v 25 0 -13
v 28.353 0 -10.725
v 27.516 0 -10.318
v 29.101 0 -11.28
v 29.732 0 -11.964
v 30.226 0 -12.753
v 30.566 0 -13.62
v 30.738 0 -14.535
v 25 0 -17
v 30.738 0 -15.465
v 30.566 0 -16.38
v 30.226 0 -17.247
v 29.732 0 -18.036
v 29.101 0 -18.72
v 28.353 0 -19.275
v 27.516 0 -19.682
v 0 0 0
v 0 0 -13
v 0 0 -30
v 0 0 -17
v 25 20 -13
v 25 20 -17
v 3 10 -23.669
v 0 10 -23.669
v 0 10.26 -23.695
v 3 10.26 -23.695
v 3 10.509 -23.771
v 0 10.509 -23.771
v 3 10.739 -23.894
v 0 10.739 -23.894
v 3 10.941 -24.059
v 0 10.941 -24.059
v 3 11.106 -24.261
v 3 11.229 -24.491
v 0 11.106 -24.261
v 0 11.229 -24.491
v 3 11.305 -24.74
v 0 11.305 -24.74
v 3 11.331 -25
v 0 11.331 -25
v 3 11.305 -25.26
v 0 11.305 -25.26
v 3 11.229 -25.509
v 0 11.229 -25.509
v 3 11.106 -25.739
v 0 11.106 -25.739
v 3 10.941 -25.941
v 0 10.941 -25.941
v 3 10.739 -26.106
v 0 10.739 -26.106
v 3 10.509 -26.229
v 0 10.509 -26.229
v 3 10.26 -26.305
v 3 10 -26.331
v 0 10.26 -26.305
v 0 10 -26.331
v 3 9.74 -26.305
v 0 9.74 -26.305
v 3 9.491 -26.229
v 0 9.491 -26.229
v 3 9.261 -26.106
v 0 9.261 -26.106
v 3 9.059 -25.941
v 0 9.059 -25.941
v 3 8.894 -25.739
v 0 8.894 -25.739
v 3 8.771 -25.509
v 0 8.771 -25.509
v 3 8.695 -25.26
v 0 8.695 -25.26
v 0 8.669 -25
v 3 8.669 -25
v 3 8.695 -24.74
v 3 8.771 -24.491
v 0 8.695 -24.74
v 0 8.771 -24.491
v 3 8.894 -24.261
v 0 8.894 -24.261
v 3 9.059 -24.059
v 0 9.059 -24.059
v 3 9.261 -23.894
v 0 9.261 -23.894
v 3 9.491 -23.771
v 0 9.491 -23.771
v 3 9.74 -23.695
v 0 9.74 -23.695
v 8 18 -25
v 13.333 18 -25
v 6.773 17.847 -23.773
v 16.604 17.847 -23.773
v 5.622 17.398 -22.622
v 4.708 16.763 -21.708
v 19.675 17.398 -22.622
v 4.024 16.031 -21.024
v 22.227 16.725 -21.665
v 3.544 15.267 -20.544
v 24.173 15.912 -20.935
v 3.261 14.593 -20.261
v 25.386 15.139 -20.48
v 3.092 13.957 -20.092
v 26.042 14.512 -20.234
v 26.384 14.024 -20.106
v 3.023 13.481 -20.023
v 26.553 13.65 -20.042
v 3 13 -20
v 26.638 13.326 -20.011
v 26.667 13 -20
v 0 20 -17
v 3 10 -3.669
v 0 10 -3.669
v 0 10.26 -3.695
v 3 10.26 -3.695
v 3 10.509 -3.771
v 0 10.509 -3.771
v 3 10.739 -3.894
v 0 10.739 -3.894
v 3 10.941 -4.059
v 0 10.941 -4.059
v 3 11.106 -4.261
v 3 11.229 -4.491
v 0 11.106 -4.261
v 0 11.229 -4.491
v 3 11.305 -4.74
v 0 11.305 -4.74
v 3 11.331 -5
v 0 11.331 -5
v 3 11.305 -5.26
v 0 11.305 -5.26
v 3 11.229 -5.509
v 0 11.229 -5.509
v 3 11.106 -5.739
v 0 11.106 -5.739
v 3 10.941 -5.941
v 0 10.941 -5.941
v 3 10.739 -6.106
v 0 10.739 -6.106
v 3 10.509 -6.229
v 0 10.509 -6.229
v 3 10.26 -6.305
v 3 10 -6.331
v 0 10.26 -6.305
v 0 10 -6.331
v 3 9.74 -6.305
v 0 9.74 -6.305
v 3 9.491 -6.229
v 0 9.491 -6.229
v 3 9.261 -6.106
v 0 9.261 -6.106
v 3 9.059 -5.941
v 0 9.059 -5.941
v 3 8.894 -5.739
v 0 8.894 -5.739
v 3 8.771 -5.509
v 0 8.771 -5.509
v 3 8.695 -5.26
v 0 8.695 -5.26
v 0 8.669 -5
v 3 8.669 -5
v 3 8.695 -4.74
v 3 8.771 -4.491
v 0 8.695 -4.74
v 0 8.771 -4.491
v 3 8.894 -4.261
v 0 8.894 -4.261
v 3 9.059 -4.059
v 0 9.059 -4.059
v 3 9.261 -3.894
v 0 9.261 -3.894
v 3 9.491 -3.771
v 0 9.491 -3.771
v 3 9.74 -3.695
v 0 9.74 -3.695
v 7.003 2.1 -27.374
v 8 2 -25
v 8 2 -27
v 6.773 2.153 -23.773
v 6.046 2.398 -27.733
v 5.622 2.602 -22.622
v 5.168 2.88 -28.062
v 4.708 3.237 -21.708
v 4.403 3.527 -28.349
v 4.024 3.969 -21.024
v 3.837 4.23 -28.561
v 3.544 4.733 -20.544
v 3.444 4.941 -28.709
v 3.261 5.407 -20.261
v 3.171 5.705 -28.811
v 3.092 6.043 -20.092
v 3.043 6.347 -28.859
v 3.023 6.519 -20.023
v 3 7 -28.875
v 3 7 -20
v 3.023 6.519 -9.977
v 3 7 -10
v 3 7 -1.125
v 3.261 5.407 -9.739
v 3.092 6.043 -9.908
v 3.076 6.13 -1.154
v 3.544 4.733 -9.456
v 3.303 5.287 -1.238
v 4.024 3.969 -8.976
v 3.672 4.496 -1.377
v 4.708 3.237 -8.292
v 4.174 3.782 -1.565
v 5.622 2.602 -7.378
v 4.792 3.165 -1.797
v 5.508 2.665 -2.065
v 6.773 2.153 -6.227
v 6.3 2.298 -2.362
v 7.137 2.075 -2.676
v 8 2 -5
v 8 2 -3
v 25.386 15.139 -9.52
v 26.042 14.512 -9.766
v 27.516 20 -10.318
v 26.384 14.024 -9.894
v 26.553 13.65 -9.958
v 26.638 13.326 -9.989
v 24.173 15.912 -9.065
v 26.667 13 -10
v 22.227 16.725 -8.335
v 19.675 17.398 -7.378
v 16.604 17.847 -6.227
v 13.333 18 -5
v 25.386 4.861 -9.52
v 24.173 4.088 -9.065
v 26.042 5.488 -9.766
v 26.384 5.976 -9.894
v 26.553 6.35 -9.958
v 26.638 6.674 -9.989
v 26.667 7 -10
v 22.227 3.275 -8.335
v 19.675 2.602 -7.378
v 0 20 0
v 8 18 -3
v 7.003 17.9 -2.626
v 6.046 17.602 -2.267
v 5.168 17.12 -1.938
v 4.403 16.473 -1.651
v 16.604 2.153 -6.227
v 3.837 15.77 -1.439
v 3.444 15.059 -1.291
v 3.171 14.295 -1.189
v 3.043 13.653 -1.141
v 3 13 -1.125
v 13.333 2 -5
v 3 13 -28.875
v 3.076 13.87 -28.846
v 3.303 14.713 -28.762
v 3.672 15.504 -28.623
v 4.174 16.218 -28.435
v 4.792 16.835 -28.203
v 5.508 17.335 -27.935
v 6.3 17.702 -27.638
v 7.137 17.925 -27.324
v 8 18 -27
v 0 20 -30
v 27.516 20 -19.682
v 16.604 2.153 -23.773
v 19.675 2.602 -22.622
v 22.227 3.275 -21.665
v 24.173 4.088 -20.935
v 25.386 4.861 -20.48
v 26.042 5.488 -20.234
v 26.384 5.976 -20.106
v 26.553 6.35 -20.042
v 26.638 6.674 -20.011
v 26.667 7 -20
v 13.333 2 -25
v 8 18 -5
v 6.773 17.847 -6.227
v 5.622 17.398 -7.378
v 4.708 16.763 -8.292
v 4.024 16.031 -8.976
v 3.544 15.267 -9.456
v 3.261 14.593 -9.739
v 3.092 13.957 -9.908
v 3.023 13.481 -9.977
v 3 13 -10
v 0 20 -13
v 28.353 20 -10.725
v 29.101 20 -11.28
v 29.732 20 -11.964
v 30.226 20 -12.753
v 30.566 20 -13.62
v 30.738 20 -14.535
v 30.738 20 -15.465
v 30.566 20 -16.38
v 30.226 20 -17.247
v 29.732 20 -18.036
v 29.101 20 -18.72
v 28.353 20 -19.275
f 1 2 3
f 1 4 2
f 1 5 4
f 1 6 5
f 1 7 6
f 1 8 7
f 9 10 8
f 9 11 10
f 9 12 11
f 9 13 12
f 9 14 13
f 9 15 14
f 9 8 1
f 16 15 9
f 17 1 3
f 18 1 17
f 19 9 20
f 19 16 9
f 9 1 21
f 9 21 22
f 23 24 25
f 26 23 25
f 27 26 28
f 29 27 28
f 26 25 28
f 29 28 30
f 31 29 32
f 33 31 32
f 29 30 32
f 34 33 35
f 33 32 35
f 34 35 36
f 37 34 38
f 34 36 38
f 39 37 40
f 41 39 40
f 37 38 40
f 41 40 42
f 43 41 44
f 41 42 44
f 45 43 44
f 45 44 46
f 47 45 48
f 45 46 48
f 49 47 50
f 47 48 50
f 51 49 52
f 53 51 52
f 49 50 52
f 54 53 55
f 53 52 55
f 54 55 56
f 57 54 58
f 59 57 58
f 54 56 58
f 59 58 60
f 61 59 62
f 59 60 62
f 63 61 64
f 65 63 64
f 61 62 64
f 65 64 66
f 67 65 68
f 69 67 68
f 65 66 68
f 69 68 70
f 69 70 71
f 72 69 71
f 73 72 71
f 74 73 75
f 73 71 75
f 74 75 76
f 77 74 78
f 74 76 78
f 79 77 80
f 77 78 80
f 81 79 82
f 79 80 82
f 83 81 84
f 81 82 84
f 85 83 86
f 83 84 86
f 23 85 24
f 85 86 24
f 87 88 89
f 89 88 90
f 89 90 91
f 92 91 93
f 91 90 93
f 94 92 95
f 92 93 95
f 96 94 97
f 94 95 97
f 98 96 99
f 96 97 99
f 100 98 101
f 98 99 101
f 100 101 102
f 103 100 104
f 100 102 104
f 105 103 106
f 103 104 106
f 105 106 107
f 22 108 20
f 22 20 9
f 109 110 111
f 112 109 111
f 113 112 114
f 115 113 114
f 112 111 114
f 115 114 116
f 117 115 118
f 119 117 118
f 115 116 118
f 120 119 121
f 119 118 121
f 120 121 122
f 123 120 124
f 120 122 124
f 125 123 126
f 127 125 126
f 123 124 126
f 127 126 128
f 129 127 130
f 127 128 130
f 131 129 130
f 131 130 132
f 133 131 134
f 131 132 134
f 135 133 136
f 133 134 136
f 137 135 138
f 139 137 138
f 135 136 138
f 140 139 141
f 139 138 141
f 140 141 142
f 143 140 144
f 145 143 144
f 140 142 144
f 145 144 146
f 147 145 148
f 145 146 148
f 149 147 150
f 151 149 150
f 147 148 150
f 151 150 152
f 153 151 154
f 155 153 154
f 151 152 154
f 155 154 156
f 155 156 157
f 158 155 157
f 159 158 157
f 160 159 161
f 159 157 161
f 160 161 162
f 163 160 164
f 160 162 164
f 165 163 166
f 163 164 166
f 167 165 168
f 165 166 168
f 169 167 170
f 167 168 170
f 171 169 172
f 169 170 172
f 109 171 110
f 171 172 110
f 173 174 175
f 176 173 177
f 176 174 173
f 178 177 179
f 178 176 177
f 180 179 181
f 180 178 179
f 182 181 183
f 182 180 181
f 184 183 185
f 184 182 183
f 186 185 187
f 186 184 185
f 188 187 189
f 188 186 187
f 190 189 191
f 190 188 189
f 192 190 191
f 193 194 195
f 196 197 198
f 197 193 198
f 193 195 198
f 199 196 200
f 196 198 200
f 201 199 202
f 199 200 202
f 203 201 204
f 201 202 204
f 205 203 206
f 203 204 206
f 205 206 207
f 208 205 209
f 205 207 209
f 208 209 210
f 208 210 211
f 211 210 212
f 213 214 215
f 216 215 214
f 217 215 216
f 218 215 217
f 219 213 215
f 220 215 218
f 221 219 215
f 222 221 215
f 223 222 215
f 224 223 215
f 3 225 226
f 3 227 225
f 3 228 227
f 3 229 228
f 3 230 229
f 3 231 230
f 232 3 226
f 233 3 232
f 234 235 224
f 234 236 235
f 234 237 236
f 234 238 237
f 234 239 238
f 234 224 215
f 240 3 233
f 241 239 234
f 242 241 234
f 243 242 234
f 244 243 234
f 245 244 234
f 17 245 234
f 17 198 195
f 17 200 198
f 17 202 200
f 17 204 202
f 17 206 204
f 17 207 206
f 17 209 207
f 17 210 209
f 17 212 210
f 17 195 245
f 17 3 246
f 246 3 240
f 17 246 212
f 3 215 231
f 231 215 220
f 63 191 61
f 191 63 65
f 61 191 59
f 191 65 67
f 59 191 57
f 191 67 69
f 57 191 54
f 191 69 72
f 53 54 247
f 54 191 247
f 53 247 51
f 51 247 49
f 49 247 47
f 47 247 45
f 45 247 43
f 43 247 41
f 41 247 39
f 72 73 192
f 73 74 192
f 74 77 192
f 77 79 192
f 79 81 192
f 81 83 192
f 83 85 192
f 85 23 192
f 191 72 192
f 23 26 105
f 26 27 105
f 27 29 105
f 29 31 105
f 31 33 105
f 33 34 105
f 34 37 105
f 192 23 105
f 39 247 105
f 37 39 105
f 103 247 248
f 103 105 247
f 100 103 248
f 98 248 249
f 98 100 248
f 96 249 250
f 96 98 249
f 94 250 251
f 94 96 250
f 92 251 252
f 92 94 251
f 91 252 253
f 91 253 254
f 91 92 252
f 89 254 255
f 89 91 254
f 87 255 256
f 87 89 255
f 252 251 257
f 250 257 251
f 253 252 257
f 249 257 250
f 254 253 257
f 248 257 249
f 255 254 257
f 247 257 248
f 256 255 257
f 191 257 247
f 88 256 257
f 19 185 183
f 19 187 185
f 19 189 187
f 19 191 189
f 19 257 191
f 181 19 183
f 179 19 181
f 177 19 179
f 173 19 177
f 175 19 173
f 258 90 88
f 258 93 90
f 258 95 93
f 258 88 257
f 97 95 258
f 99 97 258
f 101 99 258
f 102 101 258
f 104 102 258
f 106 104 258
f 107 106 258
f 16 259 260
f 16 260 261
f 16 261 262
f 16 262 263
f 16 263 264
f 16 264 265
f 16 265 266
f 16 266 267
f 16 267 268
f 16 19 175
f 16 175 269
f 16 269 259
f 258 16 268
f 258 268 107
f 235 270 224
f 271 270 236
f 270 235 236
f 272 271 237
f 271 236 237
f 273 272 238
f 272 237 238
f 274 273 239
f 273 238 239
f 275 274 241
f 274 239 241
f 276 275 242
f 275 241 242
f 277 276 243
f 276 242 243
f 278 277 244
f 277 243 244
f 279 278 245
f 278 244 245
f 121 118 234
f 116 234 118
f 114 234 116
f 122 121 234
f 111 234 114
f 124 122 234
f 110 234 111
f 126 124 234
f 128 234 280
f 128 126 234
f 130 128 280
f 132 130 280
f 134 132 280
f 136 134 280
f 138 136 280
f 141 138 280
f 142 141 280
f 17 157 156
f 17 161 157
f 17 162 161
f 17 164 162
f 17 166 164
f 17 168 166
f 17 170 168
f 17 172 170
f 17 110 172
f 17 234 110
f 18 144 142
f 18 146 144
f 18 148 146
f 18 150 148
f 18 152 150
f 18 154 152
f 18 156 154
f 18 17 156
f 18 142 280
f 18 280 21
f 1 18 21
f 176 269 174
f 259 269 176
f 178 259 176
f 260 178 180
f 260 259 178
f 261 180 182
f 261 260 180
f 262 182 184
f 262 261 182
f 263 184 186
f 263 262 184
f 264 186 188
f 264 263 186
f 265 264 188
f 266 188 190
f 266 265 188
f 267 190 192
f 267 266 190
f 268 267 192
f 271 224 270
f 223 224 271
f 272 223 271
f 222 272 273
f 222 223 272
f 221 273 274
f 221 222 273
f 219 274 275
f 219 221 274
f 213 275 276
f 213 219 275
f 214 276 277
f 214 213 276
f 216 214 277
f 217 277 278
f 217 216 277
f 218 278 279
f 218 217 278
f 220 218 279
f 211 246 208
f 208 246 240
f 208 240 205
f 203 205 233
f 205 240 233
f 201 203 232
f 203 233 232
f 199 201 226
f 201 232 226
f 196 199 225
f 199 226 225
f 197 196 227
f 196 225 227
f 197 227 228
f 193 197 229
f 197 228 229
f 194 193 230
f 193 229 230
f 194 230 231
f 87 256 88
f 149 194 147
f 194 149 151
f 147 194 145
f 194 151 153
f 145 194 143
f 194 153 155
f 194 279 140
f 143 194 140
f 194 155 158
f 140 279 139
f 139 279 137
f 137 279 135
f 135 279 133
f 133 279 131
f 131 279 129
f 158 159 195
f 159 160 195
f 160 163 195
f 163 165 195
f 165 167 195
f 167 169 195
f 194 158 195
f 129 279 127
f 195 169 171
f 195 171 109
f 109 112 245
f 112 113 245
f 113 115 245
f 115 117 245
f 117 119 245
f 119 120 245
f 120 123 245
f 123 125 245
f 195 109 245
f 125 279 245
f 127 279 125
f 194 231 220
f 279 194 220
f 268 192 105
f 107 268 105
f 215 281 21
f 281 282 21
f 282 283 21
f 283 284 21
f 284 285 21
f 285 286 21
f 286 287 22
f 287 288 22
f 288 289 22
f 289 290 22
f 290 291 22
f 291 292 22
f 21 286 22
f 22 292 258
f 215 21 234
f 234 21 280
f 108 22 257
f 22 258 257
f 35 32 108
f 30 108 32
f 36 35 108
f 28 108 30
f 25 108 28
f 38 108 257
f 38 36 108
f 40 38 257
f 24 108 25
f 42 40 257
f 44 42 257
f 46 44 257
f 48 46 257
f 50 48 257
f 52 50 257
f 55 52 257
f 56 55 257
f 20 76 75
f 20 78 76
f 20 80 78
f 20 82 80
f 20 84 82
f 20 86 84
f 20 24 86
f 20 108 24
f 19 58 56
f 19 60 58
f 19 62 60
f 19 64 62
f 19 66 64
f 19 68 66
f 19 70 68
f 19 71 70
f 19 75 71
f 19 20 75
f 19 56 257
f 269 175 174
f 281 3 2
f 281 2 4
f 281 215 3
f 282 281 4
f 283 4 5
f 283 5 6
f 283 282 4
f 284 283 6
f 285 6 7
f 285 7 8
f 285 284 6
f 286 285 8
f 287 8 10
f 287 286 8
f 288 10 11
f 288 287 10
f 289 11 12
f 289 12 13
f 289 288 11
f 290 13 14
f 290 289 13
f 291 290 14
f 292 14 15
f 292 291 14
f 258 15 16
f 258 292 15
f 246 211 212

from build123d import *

# Parameters (mm, degrees)
EXTRUDE_1_DEPTH     = 20
SKETCH_2_W          = 25
SKETCH_2_H          = 4
CUT_EXTRUDE_1_DEPTH = 20
CUT_EXTRUDE_START   = -3
SKETCH_3_W          = 10
SKETCH_3_H          = 16
CUT_EXTRUDE_2_DEPTH = 30
SKETCH_4_R          = 1.330699037
CUT_EXTRUDE_3_DEPTH = 3
FILLET_2_R          = 5
FILLET_3_R          = 5


with BuildPart() as part:
    # Эскиз1 → Бобышка-Вытянуть1 (new body)
    with BuildSketch(Plane(origin=(0, 0, 0), x_dir=(1, 0, 0), z_dir=(0, 1, 0))):
        Polygon((0, 0), (0, 30), (40, 15), align=None)
    extrude(amount=EXTRUDE_1_DEPTH)

    # Эскиз2 → Вырез-Вытянуть1 (cut)
    with BuildSketch(Plane(origin=(0, 20, 0), x_dir=(1, 0, 0), z_dir=(0, 1, 0))):
        with Locations((12.5, 15)):
            Rectangle(SKETCH_2_W, SKETCH_2_H)
    extrude(amount=-CUT_EXTRUDE_1_DEPTH, mode=Mode.SUBTRACT)

    # Эскиз3 → Вырез-Вытянуть2 (cut)
    with BuildSketch(Plane.ZY.offset(CUT_EXTRUDE_START)):
        with Locations((-25, 10)):
            Rectangle(SKETCH_3_W, SKETCH_3_H)
        with Locations((-5, 10)):
            Rectangle(SKETCH_3_W, SKETCH_3_H)
    extrude(amount=-CUT_EXTRUDE_2_DEPTH, mode=Mode.SUBTRACT)

    # Эскиз4 → Вырез-Вытянуть3 (cut)
    with BuildSketch(Plane.ZY):
        with Locations((-25, 10)):
            Circle(SKETCH_4_R)
        with Locations((-5, 10)):
            Circle(SKETCH_4_R)
    extrude(amount=-CUT_EXTRUDE_3_DEPTH, mode=Mode.SUBTRACT)

    # Скругление2
    fillet_2_edges = [part.edges().sort_by_distance(p)[0] for p in [
        (40, 10, -15),
    ]]
    fillet(fillet_2_edges, radius=FILLET_2_R)

    # Скругление3
    fillet_3_edges = [part.edges().sort_by_distance(p)[0] for p in [
        (14.833333333, 18, -20),
        (14.833333333, 2, -20),
        (3, 2, -24.4375),
        (3, 18, -24.4375),
        (14.833333333, 2, -10),
        (14.833333333, 18, -10),
        (3, 18, -5.5625),
        (3, 2, -5.5625),
    ]]
    fillet(fillet_3_edges, radius=FILLET_3_R)


solid = part.part
